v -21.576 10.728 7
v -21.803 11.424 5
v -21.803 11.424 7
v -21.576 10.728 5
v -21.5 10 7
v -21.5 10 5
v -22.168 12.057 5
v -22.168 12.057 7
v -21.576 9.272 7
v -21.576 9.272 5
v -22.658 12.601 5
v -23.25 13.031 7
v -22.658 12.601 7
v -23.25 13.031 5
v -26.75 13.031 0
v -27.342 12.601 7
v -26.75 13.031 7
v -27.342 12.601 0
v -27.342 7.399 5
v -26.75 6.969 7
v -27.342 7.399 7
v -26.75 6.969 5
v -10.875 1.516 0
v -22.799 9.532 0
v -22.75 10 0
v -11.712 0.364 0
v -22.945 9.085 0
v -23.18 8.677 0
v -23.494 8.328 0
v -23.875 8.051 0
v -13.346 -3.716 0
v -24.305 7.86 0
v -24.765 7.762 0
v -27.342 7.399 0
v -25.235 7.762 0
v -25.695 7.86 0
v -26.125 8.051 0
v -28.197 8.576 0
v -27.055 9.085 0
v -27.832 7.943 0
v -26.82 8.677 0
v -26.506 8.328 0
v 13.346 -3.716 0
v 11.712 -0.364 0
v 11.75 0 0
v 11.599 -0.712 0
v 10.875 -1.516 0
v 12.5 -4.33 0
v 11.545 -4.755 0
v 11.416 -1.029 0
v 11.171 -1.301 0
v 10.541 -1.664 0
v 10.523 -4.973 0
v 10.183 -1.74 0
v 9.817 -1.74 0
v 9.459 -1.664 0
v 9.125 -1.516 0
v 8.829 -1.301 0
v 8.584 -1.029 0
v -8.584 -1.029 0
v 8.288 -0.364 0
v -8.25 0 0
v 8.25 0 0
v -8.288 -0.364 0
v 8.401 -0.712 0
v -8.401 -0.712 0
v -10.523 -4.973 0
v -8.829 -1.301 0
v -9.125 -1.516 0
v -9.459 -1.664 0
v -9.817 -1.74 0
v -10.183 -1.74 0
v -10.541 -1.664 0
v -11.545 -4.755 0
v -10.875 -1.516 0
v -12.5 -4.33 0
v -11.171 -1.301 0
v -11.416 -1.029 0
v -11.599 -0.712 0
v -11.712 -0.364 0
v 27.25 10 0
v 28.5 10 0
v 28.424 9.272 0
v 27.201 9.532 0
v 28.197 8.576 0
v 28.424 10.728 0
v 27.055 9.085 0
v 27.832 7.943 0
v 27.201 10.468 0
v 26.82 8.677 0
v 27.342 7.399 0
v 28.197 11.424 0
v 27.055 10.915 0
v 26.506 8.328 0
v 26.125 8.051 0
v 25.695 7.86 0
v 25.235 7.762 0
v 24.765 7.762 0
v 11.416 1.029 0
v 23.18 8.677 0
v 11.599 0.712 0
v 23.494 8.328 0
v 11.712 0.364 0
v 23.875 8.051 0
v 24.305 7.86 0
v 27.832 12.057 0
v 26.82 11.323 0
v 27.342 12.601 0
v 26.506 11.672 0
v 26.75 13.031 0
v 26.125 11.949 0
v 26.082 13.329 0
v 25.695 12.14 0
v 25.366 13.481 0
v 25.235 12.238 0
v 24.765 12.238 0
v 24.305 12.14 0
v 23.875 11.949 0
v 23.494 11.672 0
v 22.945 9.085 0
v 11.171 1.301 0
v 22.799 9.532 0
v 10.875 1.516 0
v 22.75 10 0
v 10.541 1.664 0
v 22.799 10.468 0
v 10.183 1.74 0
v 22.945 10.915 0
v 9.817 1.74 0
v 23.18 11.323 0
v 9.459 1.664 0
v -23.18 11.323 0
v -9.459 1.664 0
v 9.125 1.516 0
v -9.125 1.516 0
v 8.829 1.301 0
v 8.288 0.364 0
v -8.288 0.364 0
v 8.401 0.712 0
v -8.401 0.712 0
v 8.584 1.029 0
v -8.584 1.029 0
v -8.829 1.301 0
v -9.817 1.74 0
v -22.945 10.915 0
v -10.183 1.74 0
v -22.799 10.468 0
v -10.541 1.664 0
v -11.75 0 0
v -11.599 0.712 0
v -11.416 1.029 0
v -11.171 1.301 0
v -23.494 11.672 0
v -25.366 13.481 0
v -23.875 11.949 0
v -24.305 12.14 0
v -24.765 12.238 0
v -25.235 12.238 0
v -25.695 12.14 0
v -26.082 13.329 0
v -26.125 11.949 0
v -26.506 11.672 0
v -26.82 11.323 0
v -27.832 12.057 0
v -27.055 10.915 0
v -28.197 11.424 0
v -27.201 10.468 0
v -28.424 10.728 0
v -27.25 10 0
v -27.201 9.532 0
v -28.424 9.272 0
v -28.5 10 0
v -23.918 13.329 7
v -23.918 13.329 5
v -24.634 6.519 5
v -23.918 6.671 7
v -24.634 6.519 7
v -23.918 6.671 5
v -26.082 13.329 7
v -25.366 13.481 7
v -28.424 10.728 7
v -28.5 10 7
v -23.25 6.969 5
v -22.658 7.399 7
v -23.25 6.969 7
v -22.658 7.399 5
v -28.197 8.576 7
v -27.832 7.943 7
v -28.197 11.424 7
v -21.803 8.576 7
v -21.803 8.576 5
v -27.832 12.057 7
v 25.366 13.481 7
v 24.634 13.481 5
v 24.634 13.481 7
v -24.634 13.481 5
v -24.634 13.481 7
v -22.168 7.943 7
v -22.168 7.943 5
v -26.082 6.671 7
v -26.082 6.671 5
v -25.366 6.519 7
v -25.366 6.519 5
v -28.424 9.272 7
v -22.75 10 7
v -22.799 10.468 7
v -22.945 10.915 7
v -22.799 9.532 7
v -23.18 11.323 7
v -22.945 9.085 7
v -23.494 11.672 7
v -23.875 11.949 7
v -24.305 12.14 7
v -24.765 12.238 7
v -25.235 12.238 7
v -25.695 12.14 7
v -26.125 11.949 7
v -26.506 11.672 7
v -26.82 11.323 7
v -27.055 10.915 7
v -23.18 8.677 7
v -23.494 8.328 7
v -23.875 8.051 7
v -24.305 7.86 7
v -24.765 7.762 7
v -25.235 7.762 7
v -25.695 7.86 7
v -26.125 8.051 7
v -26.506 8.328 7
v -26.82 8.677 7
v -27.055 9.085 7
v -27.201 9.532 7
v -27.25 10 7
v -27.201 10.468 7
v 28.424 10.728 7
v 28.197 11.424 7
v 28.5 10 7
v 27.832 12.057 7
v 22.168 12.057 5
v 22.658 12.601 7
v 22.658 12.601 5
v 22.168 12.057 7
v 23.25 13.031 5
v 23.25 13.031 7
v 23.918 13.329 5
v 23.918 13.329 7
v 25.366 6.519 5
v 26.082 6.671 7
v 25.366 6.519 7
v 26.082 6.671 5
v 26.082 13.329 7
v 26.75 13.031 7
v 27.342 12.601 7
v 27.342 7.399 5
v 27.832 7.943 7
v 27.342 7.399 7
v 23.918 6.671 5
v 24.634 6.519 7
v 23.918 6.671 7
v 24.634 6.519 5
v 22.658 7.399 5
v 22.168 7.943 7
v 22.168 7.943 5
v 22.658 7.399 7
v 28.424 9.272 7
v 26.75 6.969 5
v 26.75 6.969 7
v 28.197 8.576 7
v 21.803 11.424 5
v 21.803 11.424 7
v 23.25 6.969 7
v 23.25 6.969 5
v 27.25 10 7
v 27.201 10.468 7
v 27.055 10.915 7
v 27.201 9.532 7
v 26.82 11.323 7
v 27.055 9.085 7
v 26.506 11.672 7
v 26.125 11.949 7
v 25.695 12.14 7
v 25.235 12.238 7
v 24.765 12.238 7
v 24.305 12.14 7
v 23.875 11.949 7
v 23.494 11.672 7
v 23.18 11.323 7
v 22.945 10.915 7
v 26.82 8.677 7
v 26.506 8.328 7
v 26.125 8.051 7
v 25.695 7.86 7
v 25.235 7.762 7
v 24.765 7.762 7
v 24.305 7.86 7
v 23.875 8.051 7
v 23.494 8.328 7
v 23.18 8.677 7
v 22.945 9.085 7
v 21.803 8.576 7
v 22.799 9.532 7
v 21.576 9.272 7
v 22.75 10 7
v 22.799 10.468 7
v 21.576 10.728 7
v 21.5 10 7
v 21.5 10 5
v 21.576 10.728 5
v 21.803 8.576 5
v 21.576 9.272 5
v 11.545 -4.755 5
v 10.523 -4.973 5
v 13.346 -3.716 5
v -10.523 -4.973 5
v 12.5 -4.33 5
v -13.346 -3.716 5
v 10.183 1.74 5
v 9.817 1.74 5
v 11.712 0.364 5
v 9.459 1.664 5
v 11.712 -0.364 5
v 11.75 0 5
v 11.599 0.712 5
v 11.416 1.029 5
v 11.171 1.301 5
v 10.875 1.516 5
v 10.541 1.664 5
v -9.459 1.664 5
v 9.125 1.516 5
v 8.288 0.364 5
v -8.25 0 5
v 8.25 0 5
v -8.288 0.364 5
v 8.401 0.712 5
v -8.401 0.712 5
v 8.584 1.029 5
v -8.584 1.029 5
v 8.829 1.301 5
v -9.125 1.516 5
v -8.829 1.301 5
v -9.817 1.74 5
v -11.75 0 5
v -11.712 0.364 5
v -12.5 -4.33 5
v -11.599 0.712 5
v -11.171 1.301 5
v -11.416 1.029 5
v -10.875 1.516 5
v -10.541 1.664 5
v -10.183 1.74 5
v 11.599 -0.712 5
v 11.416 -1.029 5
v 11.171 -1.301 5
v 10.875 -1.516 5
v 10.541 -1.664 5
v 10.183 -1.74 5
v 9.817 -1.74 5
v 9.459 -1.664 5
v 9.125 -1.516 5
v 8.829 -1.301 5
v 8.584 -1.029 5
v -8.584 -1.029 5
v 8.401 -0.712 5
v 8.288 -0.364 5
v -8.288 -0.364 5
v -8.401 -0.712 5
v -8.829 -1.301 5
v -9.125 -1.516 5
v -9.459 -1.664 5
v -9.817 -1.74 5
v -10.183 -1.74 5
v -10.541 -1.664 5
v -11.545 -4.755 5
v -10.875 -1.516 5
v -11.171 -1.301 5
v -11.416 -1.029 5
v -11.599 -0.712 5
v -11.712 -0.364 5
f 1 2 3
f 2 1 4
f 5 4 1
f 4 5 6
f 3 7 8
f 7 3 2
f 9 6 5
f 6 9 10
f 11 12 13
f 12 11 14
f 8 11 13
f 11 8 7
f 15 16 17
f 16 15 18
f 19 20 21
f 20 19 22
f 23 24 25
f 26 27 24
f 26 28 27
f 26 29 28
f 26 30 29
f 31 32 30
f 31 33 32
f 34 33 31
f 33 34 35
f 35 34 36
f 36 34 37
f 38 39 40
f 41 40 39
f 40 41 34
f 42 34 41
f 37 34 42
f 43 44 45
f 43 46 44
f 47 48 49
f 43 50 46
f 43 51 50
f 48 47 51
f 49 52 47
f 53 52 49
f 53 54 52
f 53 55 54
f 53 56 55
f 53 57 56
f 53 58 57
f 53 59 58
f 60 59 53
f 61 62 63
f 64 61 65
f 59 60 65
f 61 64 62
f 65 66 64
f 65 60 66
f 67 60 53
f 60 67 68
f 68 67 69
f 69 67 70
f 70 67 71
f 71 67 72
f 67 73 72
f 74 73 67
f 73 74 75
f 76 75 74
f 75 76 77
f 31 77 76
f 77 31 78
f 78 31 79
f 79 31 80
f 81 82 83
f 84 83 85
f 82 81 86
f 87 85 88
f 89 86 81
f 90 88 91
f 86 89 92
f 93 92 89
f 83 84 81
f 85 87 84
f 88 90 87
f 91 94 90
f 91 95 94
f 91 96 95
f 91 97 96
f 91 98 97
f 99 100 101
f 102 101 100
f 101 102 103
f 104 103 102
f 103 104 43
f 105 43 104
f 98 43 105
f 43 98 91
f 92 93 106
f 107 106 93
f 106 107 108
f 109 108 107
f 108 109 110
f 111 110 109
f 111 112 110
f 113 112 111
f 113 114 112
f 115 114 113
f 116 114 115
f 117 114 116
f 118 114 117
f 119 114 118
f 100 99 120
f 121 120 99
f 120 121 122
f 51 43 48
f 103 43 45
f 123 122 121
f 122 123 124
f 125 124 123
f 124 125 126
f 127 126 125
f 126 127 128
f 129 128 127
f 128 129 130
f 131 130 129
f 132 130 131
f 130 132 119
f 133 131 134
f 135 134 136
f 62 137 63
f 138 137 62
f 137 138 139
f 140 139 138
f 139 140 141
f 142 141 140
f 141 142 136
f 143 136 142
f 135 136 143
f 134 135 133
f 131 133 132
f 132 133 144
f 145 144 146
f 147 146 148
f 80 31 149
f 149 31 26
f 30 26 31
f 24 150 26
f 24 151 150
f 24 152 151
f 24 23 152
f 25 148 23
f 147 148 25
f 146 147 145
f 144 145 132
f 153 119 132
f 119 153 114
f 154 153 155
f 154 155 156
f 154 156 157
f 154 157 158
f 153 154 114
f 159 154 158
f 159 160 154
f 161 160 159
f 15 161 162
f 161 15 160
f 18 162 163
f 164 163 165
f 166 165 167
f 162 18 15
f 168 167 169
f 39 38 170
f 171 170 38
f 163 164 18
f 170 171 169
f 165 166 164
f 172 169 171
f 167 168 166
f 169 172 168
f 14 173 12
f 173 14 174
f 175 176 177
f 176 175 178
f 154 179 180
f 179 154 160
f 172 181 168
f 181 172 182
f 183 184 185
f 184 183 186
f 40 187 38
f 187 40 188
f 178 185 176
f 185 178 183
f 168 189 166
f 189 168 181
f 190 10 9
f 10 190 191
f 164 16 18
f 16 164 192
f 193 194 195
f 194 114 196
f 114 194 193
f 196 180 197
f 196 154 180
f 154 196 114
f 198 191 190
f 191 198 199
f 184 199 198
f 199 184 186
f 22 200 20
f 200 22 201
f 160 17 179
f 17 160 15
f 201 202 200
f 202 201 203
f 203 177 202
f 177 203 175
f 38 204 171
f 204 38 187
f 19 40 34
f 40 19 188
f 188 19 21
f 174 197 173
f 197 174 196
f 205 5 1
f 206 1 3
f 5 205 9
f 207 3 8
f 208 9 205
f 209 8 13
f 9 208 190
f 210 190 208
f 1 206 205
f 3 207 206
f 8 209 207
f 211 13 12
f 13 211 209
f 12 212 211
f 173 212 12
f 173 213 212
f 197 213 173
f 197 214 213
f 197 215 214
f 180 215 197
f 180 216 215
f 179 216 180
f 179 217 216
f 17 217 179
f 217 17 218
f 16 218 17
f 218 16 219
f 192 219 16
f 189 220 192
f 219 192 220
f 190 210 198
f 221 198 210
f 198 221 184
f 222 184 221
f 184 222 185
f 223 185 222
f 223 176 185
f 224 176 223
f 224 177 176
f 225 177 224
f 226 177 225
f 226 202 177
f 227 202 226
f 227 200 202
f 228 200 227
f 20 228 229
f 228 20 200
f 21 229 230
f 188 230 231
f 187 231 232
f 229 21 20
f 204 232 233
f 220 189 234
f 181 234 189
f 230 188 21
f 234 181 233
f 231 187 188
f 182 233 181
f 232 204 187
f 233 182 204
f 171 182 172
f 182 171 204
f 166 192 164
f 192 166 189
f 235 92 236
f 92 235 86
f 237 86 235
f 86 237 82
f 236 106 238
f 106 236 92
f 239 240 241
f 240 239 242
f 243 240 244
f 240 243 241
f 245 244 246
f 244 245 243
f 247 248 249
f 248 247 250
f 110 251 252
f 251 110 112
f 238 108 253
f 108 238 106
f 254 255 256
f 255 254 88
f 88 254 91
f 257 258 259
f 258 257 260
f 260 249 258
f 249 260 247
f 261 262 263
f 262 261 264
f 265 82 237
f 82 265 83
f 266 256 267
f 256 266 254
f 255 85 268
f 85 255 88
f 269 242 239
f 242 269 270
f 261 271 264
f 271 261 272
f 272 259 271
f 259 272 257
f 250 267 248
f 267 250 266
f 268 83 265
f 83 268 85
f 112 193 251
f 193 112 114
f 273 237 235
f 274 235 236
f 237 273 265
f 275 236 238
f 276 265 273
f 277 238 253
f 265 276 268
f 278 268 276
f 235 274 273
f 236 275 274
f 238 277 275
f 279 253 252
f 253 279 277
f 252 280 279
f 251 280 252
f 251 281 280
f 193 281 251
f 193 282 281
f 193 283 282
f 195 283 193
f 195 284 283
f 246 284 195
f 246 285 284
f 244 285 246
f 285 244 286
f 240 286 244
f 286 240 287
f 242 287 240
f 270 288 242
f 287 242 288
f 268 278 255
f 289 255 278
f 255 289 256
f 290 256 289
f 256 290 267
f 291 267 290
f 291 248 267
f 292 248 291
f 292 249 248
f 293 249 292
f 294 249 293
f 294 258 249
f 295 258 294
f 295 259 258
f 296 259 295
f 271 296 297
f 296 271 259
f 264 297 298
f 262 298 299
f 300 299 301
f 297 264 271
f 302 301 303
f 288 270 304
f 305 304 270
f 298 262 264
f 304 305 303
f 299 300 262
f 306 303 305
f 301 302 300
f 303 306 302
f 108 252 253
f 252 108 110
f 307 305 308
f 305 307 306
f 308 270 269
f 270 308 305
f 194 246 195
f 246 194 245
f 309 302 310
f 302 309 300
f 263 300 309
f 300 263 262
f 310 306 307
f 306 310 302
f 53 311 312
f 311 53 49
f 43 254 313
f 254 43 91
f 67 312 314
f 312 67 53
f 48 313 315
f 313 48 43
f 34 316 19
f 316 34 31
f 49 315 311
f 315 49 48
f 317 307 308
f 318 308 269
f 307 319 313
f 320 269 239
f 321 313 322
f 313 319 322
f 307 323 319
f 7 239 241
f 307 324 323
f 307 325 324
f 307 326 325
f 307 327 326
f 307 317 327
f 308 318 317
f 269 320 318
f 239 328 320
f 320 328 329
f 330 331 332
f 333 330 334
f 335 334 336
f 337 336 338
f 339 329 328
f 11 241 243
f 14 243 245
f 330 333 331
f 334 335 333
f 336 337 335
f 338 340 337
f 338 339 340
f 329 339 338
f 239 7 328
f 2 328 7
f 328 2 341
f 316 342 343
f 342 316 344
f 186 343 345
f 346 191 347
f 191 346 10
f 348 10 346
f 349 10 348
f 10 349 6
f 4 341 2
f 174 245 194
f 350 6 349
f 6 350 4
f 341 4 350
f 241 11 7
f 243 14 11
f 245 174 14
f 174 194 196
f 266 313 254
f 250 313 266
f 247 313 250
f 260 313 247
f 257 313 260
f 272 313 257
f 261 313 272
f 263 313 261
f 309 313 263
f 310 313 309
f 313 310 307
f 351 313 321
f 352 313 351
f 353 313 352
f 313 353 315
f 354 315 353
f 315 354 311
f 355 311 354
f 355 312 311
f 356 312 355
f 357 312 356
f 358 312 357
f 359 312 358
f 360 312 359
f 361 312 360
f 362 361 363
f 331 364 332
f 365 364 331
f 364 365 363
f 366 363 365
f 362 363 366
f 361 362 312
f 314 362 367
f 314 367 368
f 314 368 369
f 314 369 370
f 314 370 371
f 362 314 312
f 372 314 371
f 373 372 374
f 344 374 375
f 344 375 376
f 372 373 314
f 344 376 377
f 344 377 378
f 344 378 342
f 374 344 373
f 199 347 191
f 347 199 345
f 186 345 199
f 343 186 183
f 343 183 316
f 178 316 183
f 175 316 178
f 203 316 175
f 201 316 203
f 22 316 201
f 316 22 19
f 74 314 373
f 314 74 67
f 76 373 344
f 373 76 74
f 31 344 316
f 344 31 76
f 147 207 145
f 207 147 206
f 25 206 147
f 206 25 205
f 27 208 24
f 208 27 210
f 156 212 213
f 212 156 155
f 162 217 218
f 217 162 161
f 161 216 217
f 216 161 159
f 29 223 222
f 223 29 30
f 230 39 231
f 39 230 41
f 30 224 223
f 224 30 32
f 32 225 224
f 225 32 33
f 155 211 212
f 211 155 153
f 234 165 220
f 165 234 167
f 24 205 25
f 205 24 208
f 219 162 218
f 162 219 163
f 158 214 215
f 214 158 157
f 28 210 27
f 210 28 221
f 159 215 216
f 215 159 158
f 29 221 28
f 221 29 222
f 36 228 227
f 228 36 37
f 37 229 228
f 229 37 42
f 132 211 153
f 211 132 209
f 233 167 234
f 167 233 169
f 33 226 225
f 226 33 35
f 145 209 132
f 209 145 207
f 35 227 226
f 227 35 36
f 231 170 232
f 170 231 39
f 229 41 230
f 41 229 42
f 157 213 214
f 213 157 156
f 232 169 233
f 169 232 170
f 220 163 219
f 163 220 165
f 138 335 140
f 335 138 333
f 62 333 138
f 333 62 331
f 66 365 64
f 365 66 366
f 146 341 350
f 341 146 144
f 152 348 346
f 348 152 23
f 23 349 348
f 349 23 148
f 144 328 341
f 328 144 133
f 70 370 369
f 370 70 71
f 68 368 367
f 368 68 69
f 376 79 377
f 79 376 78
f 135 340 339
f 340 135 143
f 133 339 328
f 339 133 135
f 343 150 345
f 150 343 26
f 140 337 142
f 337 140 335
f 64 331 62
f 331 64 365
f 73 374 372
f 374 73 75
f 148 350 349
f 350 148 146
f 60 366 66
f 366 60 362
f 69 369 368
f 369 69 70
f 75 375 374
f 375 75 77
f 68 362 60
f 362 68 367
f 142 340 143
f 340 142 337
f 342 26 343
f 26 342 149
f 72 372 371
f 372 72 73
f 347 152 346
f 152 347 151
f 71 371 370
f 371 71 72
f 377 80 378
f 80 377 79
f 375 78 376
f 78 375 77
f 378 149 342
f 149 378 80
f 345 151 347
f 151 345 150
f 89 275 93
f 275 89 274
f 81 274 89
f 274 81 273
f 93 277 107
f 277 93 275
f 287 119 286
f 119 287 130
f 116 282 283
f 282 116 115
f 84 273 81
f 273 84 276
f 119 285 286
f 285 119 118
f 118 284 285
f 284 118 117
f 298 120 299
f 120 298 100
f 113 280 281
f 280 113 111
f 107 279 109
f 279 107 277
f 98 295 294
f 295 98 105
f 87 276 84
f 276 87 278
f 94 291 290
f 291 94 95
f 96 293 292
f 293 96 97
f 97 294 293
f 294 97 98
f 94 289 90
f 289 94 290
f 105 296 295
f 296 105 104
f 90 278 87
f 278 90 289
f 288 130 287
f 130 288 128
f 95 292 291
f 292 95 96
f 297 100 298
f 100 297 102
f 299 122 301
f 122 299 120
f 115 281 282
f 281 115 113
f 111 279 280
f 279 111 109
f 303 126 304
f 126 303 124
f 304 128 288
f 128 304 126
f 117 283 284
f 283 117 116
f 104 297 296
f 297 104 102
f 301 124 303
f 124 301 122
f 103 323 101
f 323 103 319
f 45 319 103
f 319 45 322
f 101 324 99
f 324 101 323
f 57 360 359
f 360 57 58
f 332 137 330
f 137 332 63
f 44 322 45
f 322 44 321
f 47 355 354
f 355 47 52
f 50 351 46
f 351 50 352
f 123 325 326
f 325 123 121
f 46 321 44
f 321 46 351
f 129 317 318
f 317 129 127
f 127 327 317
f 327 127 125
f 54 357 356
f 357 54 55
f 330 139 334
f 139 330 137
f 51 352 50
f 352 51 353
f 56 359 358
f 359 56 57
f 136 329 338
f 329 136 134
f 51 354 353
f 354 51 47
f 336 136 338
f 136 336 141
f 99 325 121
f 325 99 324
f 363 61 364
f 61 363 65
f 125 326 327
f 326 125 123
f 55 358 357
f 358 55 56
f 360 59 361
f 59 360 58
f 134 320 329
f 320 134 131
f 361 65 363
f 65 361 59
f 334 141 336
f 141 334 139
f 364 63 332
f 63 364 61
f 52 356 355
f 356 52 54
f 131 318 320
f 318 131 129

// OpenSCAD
ROD_MOUNT_HOLE_DIA = 4.5;
ROD_MOUNT_HOLE_SPACING = 50;
ROD_MOUNT_DIA = 7;
ROD_MOUNT_HEIGHT = 7;
ROD_MOUNT_OFFSET = 10;

MOUNT_DIA = 10;
MOUNT_HOLE_DIA = 3.5;
MOUNT_HOLE_SPACING = 20;

THICKNESS = 5;

$fn = 30;

difference() {
  union() {
    hull() {
      for(i = [-1, 1]) {
        translate([i * ROD_MOUNT_HOLE_SPACING/2, ROD_MOUNT_OFFSET, 0])
        cylinder(d = ROD_MOUNT_DIA, h = THICKNESS);

        translate([i * MOUNT_HOLE_SPACING/2, 0, 0])
        cylinder(d = MOUNT_DIA, h = THICKNESS);
      }
    }
    for(i = [-1, 1]) {
      translate([i * ROD_MOUNT_HOLE_SPACING/2, ROD_MOUNT_OFFSET, 0])
      cylinder(d = ROD_MOUNT_DIA, h = ROD_MOUNT_HEIGHT);
    }
  }

  #for(i = [-1, 1]) {
    translate([i * ROD_MOUNT_HOLE_SPACING/2, ROD_MOUNT_OFFSET, 0])
    cylinder(d = ROD_MOUNT_HOLE_DIA, h = ROD_MOUNT_HEIGHT);

    translate([i * MOUNT_HOLE_SPACING/2, 0, 0])
    cylinder(d = MOUNT_HOLE_DIA, h = THICKNESS);
  }
}
